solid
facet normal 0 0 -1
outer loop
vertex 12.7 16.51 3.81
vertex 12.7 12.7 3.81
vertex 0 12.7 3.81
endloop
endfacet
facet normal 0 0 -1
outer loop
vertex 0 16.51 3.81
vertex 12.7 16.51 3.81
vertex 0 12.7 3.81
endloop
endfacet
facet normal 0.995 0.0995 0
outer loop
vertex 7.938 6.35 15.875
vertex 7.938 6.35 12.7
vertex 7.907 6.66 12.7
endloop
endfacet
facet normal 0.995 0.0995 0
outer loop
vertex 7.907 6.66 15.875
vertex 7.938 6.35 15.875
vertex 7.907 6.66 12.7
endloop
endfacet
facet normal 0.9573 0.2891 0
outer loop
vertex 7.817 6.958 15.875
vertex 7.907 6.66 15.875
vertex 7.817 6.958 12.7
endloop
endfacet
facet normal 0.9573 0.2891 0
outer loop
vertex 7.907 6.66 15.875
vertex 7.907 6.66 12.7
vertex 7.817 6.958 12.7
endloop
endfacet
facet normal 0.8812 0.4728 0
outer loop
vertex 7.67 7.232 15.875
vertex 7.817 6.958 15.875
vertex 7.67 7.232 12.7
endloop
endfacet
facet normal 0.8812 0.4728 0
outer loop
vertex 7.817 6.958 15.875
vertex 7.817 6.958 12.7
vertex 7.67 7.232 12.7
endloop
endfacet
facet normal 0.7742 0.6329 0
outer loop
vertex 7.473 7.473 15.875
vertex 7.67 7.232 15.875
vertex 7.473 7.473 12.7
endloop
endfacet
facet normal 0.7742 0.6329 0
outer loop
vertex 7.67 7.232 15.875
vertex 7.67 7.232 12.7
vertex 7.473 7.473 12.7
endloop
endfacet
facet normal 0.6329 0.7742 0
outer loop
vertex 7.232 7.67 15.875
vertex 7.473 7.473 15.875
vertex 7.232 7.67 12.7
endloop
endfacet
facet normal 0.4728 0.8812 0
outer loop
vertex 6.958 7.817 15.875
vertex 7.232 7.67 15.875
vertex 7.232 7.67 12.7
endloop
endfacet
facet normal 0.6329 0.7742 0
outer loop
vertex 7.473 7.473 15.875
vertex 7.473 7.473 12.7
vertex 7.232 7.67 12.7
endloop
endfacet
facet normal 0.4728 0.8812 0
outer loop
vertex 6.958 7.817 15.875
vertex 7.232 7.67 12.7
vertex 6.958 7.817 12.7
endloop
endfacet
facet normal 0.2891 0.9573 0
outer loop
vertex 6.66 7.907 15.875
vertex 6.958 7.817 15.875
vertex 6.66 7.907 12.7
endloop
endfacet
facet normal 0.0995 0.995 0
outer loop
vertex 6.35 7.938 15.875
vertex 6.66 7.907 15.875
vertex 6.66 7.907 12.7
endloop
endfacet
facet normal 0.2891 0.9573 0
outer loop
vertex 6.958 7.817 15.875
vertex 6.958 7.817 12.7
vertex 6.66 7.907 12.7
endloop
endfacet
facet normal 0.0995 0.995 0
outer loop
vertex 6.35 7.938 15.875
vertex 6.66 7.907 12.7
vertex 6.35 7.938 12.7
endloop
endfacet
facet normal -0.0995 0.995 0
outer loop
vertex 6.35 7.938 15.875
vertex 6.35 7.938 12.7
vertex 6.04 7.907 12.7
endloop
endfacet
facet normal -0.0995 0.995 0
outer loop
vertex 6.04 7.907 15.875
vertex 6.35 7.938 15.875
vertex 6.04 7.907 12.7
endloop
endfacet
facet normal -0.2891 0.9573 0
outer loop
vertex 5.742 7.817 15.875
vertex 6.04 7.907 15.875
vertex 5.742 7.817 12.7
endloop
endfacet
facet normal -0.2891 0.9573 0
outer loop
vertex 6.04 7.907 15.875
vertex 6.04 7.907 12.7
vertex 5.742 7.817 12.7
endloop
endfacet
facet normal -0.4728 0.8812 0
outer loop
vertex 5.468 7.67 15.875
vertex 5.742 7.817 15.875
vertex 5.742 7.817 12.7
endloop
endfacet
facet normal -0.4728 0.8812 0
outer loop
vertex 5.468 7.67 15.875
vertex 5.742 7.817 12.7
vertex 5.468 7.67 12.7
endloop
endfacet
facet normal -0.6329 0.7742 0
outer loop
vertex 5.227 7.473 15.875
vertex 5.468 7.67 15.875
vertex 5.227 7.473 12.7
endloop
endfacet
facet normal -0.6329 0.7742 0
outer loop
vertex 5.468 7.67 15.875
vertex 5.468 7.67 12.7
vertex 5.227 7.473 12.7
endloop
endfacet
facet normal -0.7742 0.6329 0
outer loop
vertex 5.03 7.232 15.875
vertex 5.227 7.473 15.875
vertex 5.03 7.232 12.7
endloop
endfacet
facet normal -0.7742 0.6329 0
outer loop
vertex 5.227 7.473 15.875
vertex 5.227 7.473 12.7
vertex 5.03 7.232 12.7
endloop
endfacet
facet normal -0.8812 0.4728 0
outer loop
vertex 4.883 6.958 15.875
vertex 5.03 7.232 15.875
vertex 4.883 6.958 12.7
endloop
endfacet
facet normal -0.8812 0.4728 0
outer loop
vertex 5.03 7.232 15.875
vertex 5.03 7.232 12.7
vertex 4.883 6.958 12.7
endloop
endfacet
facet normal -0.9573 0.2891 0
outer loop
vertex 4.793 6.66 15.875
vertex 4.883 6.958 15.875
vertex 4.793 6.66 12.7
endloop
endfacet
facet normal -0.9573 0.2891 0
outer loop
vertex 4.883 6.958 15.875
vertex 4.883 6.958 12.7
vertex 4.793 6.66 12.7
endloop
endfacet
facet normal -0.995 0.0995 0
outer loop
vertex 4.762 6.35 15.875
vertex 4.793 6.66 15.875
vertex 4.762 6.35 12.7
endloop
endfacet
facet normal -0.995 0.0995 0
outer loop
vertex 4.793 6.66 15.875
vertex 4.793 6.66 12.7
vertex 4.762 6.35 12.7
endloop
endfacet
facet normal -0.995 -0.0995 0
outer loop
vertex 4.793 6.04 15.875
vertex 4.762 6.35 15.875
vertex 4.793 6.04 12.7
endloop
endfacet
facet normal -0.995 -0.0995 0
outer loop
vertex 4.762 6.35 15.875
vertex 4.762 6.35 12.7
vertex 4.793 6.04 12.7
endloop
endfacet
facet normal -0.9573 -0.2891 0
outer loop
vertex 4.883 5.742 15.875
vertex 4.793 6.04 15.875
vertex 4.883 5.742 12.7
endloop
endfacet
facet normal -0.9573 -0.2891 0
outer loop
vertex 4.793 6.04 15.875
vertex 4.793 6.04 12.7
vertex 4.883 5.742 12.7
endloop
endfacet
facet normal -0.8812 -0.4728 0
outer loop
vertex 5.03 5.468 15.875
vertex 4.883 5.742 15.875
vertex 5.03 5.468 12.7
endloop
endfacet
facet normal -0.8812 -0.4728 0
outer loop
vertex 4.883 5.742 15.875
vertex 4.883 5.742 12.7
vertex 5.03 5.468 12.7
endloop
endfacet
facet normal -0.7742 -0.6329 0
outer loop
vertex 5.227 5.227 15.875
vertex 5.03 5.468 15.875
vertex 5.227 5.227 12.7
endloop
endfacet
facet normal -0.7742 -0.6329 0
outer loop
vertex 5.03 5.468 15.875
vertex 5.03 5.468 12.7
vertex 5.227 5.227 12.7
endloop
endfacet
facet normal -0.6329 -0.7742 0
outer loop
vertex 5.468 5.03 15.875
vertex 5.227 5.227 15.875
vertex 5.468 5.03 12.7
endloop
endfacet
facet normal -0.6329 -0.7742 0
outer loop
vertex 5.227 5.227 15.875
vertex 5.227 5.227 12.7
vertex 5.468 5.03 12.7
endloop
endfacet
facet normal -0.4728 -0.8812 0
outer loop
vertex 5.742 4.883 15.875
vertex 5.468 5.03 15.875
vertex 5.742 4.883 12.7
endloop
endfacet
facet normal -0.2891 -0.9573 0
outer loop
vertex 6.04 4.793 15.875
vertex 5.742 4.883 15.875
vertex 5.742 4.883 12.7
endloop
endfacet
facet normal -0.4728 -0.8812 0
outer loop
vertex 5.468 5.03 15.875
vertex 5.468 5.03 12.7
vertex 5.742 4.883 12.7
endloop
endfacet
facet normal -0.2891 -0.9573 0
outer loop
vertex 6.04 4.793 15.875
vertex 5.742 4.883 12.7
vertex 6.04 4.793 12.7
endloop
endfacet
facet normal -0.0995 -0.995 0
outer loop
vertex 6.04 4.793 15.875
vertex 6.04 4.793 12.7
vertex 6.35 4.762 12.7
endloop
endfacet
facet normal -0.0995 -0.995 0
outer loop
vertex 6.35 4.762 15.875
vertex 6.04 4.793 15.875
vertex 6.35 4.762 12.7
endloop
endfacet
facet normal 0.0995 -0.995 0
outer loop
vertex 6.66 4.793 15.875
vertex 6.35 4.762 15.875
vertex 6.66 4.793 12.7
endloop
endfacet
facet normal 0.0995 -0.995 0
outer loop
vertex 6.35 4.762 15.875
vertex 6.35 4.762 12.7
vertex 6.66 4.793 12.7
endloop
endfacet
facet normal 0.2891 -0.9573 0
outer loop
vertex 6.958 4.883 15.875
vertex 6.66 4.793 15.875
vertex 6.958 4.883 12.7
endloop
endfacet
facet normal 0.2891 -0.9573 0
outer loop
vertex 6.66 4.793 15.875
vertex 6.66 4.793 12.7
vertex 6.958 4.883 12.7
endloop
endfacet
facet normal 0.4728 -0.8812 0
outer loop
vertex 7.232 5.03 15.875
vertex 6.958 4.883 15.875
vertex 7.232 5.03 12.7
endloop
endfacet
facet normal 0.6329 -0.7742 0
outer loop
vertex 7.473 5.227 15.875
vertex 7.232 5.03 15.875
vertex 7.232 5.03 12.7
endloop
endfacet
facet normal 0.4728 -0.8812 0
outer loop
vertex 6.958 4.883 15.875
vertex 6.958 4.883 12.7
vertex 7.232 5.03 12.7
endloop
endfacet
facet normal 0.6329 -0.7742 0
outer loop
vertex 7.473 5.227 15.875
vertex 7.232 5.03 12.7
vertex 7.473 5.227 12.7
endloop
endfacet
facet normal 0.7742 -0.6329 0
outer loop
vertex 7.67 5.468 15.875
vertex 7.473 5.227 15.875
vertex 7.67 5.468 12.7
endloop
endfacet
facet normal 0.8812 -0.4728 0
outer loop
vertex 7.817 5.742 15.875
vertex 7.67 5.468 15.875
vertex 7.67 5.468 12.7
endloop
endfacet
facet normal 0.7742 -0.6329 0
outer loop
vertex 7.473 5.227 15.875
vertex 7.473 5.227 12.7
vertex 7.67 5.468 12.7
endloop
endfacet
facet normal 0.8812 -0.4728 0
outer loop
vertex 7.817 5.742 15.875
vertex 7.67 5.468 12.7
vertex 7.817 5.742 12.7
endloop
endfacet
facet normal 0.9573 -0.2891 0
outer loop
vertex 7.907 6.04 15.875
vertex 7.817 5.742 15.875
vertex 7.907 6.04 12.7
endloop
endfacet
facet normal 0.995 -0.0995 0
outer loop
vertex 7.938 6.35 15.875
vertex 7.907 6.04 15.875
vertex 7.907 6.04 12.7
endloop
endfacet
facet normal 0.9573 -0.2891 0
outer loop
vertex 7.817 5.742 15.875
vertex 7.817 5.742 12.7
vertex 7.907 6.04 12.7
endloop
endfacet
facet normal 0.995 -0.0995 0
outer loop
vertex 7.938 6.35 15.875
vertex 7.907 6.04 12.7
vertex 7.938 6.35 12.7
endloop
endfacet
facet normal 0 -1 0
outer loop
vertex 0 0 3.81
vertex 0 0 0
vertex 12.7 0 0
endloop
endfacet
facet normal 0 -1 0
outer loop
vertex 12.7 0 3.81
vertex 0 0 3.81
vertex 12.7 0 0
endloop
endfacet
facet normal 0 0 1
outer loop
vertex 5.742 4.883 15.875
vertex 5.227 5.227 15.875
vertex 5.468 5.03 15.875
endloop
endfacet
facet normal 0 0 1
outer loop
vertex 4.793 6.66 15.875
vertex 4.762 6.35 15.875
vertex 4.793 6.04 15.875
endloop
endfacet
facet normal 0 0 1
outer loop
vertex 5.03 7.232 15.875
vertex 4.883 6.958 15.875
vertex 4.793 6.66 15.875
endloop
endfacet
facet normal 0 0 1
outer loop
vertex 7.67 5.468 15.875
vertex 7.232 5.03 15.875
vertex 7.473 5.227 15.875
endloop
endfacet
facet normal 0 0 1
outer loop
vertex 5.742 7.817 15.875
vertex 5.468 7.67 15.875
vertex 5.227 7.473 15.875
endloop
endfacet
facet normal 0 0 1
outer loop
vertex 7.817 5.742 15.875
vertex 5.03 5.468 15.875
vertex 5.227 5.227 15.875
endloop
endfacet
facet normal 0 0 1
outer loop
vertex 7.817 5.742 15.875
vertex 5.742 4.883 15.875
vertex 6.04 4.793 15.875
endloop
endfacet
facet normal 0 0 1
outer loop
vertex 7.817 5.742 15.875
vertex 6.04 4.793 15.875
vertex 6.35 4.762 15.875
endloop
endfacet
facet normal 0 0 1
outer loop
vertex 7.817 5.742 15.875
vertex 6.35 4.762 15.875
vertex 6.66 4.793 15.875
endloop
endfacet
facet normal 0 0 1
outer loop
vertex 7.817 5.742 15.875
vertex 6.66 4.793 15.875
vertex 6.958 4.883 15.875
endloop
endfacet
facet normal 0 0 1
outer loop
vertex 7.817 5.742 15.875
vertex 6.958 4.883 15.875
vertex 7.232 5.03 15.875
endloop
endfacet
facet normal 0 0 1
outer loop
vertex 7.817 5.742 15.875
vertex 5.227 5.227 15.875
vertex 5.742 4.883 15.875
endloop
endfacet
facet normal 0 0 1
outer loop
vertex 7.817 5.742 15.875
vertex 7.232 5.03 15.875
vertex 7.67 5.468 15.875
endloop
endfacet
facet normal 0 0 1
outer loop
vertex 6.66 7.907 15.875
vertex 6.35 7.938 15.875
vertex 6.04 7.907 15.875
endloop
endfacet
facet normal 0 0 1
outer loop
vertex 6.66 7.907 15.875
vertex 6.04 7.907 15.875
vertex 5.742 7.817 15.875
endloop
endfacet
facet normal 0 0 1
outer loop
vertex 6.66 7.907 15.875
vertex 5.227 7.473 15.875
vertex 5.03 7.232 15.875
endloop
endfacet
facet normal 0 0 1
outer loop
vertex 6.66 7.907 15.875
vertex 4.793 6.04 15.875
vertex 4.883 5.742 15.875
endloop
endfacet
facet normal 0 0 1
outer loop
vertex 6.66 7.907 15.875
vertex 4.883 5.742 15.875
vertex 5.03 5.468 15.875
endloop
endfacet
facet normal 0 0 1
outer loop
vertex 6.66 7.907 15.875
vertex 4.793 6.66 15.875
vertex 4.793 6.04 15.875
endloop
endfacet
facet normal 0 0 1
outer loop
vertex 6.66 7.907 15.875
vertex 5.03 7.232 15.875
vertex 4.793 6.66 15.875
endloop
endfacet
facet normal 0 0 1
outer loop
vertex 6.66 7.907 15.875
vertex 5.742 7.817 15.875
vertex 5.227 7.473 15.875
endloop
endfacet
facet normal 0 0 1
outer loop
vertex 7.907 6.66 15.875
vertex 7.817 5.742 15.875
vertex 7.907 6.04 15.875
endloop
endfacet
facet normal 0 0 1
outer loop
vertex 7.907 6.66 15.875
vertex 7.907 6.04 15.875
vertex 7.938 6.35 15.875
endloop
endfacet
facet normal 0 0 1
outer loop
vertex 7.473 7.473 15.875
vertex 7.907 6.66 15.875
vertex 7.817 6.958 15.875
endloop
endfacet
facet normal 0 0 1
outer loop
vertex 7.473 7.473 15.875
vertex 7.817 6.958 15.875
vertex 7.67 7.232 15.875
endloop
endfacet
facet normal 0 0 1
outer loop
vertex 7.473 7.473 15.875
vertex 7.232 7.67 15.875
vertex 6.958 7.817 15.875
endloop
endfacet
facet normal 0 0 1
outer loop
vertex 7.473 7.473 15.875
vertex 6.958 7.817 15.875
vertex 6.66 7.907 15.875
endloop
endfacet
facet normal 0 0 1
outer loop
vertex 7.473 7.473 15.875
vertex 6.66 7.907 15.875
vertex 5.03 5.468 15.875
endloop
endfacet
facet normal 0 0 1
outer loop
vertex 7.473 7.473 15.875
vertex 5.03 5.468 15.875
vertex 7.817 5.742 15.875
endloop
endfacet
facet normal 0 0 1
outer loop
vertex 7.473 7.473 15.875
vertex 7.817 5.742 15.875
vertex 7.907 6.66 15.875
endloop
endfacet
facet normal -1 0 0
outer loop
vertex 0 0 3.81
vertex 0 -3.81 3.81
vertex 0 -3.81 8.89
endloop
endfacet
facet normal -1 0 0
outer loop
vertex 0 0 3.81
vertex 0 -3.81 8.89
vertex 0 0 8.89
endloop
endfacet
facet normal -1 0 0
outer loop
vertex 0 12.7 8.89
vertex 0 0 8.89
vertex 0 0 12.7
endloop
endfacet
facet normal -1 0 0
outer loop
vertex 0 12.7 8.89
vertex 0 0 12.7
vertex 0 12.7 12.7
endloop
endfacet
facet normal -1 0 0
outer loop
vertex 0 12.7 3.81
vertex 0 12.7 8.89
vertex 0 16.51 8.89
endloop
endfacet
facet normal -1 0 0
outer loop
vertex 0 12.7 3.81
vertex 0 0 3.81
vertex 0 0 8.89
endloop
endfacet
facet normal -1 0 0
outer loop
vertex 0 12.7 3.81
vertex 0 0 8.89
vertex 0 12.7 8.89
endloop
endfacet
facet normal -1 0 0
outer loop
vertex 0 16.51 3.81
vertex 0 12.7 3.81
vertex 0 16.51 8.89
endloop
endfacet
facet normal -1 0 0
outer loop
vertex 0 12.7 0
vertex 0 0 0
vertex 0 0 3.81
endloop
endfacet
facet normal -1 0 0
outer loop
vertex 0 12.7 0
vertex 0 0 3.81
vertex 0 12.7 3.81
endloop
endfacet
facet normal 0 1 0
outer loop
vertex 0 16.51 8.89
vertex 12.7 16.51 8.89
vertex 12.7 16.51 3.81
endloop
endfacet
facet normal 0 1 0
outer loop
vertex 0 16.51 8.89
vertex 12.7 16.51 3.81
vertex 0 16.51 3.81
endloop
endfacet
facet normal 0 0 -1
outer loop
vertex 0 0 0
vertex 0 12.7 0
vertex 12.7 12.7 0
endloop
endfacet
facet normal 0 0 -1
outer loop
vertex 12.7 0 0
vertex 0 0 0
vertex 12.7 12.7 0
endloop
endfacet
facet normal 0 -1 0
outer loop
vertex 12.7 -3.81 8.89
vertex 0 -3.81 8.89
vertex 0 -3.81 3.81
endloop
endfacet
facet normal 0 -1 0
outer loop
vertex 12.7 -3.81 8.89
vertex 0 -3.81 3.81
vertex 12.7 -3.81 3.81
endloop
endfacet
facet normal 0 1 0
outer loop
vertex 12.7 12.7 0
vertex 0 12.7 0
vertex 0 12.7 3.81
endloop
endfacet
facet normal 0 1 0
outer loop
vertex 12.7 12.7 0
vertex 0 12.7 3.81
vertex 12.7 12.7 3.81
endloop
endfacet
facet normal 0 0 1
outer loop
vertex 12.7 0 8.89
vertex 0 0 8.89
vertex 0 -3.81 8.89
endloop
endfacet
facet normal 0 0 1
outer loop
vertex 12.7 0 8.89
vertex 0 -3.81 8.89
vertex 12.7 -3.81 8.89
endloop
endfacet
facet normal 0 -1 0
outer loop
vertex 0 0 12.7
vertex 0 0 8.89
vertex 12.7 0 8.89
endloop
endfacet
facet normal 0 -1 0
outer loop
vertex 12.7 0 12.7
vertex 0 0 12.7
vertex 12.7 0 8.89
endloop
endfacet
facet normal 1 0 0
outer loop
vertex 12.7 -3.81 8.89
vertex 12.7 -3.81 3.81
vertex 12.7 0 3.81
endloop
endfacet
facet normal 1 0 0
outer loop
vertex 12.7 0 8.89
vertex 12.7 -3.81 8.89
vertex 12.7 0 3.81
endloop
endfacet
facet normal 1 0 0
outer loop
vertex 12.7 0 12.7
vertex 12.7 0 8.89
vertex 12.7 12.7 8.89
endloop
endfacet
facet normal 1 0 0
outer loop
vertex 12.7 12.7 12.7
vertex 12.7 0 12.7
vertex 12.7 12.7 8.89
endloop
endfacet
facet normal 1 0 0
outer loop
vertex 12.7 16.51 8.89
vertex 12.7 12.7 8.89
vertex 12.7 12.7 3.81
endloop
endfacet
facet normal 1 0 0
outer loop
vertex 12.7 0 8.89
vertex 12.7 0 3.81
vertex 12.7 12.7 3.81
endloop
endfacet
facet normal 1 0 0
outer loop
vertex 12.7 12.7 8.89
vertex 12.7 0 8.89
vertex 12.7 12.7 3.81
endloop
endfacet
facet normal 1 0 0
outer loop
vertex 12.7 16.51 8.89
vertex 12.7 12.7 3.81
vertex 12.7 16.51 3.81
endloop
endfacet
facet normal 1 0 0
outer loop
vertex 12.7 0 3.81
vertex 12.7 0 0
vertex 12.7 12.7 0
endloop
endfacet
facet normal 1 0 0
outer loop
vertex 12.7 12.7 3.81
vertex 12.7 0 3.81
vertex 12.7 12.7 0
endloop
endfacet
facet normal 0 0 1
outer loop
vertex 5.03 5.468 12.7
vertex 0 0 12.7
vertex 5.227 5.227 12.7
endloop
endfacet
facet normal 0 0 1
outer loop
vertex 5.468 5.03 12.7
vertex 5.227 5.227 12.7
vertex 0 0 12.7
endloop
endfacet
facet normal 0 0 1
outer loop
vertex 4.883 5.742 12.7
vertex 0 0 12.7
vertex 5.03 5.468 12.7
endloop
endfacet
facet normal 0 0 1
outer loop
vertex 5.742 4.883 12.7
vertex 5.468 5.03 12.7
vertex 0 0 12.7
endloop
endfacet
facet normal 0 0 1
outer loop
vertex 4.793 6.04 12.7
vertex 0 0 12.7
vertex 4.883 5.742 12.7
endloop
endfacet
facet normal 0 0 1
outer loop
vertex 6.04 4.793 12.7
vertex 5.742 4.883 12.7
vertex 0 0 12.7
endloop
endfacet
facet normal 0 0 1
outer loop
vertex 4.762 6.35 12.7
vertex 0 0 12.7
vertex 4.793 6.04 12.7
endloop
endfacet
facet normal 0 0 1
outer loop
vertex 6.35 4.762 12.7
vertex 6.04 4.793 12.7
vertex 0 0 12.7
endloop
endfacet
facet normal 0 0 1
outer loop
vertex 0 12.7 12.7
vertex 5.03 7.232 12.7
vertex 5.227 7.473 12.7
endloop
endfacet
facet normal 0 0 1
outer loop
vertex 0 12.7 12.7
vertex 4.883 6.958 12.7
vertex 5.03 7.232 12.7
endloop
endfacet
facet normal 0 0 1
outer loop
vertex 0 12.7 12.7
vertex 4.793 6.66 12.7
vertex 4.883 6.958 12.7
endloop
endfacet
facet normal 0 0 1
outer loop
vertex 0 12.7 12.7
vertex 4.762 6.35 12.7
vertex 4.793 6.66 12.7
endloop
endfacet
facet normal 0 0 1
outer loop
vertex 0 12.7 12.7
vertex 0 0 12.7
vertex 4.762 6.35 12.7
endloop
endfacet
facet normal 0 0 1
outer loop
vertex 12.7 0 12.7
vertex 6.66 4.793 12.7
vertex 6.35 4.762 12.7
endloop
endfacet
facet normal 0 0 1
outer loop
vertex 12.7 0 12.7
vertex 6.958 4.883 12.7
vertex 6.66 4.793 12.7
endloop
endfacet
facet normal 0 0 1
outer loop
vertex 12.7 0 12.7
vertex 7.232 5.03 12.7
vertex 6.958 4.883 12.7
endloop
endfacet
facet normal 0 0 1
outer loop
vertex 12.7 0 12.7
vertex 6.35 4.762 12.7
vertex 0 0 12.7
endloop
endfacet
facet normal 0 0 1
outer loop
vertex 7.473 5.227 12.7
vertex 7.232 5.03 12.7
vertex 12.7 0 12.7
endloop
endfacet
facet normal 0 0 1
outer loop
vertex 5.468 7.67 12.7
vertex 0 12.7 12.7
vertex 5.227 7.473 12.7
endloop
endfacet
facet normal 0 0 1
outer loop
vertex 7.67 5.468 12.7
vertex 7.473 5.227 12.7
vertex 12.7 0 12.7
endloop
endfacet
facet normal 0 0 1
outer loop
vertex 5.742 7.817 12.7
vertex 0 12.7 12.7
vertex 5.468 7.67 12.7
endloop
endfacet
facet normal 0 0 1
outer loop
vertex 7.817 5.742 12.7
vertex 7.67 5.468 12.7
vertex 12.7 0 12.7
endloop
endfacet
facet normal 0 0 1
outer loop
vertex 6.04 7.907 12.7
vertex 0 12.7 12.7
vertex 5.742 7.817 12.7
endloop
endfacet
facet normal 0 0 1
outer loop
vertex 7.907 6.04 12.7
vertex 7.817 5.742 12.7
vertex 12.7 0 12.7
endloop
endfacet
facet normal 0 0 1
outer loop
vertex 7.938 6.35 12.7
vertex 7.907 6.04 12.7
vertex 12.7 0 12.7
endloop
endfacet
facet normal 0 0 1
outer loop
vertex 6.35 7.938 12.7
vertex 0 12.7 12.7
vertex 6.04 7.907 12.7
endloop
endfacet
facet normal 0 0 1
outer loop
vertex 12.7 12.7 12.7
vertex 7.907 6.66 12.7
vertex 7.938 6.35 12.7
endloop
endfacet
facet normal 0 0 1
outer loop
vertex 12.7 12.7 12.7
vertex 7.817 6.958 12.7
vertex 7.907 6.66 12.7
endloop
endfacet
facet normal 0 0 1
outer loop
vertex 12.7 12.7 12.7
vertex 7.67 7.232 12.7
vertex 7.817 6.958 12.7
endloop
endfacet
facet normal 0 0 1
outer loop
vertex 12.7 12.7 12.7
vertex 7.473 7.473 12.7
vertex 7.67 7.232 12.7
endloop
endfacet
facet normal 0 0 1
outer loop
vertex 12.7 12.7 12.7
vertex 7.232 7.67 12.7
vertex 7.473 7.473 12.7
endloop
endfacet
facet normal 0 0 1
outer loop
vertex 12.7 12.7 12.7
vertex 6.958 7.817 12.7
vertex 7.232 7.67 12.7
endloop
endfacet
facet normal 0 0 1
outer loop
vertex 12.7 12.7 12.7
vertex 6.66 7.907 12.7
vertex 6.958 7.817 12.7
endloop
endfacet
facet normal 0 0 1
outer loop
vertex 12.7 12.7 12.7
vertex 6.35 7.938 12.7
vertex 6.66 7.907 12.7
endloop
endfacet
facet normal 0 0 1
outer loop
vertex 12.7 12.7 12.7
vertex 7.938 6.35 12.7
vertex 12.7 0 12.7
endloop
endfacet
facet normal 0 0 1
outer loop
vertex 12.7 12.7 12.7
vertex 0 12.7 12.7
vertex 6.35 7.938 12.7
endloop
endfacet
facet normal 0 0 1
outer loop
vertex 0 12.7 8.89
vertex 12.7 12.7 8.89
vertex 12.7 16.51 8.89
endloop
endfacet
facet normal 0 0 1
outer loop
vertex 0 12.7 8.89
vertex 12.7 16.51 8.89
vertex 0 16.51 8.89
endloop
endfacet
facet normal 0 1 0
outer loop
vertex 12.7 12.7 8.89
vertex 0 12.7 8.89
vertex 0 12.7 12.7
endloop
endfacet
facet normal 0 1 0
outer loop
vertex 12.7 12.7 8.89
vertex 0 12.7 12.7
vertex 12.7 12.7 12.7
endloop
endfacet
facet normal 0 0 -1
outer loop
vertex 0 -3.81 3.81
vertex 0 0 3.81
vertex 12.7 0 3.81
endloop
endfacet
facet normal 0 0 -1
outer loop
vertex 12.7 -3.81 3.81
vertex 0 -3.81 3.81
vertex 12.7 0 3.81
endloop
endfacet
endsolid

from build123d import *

# Parameters (mm, degrees)
F0_W     = 12.7
F0_H     = 12.7
F1_DEPTH = 12.7
F2_R     = 1.5875
F3_DEPTH = 3.175
F4_W     = 12.7
F4_H     = 5.08
F5_DEPTH = 3.81
F6_W     = 12.7
F6_H     = 5.08
F7_DEPTH = 3.81


with BuildPart() as f1:
    # F0 (on Top) → F1 (new body)
    with BuildSketch(Plane.XY):
        with Locations((6.35, 6.35)):
            Rectangle(F0_W, F0_H)
    extrude(amount=F1_DEPTH)

    # F2 (on face) → F3 (join)
    with BuildSketch(Plane.XY.offset(12.7)):
        with Locations((6.35, 6.35)):
            Circle(F2_R)
    extrude(amount=F3_DEPTH)

    # F4 (on face) → F5 (join)
    with BuildSketch(Plane.XZ):
        with Locations((6.35, 6.35)):
            Rectangle(F4_W, F4_H)
    extrude(amount=F5_DEPTH)

    # F6 (on face) → F7 (join)
    with BuildSketch(Plane(origin=(0, 12.7, 0), x_dir=(-1, 0, 0), z_dir=(0, 1, 0))):
        with Locations((-6.35, 6.35)):
            Rectangle(F6_W, F6_H)
    extrude(amount=F7_DEPTH)


solid = f1.part
